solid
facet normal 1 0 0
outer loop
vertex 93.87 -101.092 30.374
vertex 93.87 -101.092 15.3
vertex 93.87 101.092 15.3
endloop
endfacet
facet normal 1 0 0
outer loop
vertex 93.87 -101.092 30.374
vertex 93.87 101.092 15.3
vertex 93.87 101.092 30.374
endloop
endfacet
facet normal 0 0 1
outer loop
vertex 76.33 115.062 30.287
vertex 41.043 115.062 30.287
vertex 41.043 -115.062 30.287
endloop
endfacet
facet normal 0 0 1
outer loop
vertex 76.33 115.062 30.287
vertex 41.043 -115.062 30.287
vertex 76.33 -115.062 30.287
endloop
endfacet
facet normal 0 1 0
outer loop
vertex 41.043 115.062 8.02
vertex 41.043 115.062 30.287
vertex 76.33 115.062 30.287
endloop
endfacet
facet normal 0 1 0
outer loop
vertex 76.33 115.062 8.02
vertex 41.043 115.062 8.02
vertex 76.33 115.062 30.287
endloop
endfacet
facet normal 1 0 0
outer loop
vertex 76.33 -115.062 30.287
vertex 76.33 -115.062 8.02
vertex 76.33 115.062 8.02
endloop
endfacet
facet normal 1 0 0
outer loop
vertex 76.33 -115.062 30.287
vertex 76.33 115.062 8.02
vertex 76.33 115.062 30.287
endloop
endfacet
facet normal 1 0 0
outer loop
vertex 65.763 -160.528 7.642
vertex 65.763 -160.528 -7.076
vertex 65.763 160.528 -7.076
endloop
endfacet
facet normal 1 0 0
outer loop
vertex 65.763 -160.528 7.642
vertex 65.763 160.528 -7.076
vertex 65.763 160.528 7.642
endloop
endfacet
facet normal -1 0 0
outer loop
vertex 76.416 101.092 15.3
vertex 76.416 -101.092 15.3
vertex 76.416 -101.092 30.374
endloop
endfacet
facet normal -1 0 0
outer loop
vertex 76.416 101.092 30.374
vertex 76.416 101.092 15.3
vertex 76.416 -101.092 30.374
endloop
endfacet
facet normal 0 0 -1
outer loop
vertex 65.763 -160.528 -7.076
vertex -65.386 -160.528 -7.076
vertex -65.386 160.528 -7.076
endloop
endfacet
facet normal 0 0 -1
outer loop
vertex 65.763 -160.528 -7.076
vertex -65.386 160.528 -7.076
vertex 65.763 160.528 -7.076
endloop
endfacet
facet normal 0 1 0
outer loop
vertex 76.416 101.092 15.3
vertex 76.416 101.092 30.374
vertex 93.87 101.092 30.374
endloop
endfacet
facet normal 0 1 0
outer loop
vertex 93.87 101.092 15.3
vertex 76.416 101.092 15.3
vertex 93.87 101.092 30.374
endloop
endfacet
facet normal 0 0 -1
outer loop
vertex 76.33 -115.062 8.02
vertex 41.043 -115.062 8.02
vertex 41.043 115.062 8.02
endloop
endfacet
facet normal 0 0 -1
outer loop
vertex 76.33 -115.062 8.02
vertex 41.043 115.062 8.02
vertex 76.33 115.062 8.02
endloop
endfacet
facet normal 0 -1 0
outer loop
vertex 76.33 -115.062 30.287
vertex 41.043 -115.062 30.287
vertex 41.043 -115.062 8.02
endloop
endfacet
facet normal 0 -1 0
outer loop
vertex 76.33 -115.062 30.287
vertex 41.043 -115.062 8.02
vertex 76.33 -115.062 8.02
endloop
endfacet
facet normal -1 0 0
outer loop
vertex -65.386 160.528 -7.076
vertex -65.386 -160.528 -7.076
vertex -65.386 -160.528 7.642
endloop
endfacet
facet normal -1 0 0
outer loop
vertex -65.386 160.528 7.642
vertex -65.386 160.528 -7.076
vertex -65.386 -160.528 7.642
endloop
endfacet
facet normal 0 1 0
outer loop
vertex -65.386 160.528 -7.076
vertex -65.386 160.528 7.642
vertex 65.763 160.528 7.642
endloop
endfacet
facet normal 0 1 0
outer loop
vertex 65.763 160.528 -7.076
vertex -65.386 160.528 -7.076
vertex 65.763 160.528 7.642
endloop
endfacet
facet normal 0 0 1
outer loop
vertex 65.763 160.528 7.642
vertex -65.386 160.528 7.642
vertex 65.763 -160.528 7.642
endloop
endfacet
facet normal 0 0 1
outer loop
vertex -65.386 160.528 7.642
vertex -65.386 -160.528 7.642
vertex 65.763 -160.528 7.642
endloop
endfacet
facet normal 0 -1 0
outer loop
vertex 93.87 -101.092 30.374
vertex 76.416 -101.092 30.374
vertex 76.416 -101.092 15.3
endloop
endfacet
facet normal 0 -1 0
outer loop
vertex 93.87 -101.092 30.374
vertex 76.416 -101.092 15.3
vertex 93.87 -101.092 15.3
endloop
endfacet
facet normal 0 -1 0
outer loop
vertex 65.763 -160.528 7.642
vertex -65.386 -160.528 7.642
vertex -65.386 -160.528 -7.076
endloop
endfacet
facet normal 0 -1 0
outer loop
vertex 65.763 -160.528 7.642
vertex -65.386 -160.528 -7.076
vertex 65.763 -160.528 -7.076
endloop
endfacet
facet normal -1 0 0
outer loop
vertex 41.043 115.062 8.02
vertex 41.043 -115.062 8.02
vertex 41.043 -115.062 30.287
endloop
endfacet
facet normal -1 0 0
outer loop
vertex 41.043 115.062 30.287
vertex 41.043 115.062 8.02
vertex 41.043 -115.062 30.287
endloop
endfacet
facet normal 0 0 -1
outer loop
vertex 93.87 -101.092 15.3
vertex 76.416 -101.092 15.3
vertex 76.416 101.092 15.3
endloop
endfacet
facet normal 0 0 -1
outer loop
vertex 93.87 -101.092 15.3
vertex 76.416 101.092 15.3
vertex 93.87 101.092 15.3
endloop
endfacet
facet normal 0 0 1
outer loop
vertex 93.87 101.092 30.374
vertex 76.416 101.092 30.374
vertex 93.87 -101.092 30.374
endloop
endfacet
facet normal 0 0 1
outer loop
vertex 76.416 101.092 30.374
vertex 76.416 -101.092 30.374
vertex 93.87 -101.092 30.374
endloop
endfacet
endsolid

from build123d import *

# Parameters (mm, degrees)
F0_W     = 131.148472
F0_H     = 14.718821
F4_DEPTH = 160.528
F1_W     = 35.287433
F1_H     = 22.266936
F5_DEPTH = 115.062
F6_W     = 17.45475
F6_H     = 15.074555
F7_DEPTH = 101.092


with BuildPart() as f4:
    # F0 (on Front) → F4 (new body, symmetric)
    with BuildSketch(Plane.XZ):
        with Locations((0.188701, 0.283053)):
            Rectangle(F0_W, F0_H)
    extrude(amount=F4_DEPTH, both=True)


with BuildPart() as f5:
    # F1 (on Front) → F5 (new body, symmetric)
    with BuildSketch(Plane.XZ):
        with Locations((58.686581, 19.153338)):
            Rectangle(F1_W, F1_H)
    extrude(amount=F5_DEPTH, both=True)


with BuildPart() as f7:
    # F6 (on face) → F7 (new body, symmetric)
    with BuildSketch(Plane.XZ):
        with Locations((85.143011, 22.837007)):
            Rectangle(F6_W, F6_H)
    extrude(amount=F7_DEPTH, both=True)


solid = Compound([f4.part, f5.part, f7.part])
